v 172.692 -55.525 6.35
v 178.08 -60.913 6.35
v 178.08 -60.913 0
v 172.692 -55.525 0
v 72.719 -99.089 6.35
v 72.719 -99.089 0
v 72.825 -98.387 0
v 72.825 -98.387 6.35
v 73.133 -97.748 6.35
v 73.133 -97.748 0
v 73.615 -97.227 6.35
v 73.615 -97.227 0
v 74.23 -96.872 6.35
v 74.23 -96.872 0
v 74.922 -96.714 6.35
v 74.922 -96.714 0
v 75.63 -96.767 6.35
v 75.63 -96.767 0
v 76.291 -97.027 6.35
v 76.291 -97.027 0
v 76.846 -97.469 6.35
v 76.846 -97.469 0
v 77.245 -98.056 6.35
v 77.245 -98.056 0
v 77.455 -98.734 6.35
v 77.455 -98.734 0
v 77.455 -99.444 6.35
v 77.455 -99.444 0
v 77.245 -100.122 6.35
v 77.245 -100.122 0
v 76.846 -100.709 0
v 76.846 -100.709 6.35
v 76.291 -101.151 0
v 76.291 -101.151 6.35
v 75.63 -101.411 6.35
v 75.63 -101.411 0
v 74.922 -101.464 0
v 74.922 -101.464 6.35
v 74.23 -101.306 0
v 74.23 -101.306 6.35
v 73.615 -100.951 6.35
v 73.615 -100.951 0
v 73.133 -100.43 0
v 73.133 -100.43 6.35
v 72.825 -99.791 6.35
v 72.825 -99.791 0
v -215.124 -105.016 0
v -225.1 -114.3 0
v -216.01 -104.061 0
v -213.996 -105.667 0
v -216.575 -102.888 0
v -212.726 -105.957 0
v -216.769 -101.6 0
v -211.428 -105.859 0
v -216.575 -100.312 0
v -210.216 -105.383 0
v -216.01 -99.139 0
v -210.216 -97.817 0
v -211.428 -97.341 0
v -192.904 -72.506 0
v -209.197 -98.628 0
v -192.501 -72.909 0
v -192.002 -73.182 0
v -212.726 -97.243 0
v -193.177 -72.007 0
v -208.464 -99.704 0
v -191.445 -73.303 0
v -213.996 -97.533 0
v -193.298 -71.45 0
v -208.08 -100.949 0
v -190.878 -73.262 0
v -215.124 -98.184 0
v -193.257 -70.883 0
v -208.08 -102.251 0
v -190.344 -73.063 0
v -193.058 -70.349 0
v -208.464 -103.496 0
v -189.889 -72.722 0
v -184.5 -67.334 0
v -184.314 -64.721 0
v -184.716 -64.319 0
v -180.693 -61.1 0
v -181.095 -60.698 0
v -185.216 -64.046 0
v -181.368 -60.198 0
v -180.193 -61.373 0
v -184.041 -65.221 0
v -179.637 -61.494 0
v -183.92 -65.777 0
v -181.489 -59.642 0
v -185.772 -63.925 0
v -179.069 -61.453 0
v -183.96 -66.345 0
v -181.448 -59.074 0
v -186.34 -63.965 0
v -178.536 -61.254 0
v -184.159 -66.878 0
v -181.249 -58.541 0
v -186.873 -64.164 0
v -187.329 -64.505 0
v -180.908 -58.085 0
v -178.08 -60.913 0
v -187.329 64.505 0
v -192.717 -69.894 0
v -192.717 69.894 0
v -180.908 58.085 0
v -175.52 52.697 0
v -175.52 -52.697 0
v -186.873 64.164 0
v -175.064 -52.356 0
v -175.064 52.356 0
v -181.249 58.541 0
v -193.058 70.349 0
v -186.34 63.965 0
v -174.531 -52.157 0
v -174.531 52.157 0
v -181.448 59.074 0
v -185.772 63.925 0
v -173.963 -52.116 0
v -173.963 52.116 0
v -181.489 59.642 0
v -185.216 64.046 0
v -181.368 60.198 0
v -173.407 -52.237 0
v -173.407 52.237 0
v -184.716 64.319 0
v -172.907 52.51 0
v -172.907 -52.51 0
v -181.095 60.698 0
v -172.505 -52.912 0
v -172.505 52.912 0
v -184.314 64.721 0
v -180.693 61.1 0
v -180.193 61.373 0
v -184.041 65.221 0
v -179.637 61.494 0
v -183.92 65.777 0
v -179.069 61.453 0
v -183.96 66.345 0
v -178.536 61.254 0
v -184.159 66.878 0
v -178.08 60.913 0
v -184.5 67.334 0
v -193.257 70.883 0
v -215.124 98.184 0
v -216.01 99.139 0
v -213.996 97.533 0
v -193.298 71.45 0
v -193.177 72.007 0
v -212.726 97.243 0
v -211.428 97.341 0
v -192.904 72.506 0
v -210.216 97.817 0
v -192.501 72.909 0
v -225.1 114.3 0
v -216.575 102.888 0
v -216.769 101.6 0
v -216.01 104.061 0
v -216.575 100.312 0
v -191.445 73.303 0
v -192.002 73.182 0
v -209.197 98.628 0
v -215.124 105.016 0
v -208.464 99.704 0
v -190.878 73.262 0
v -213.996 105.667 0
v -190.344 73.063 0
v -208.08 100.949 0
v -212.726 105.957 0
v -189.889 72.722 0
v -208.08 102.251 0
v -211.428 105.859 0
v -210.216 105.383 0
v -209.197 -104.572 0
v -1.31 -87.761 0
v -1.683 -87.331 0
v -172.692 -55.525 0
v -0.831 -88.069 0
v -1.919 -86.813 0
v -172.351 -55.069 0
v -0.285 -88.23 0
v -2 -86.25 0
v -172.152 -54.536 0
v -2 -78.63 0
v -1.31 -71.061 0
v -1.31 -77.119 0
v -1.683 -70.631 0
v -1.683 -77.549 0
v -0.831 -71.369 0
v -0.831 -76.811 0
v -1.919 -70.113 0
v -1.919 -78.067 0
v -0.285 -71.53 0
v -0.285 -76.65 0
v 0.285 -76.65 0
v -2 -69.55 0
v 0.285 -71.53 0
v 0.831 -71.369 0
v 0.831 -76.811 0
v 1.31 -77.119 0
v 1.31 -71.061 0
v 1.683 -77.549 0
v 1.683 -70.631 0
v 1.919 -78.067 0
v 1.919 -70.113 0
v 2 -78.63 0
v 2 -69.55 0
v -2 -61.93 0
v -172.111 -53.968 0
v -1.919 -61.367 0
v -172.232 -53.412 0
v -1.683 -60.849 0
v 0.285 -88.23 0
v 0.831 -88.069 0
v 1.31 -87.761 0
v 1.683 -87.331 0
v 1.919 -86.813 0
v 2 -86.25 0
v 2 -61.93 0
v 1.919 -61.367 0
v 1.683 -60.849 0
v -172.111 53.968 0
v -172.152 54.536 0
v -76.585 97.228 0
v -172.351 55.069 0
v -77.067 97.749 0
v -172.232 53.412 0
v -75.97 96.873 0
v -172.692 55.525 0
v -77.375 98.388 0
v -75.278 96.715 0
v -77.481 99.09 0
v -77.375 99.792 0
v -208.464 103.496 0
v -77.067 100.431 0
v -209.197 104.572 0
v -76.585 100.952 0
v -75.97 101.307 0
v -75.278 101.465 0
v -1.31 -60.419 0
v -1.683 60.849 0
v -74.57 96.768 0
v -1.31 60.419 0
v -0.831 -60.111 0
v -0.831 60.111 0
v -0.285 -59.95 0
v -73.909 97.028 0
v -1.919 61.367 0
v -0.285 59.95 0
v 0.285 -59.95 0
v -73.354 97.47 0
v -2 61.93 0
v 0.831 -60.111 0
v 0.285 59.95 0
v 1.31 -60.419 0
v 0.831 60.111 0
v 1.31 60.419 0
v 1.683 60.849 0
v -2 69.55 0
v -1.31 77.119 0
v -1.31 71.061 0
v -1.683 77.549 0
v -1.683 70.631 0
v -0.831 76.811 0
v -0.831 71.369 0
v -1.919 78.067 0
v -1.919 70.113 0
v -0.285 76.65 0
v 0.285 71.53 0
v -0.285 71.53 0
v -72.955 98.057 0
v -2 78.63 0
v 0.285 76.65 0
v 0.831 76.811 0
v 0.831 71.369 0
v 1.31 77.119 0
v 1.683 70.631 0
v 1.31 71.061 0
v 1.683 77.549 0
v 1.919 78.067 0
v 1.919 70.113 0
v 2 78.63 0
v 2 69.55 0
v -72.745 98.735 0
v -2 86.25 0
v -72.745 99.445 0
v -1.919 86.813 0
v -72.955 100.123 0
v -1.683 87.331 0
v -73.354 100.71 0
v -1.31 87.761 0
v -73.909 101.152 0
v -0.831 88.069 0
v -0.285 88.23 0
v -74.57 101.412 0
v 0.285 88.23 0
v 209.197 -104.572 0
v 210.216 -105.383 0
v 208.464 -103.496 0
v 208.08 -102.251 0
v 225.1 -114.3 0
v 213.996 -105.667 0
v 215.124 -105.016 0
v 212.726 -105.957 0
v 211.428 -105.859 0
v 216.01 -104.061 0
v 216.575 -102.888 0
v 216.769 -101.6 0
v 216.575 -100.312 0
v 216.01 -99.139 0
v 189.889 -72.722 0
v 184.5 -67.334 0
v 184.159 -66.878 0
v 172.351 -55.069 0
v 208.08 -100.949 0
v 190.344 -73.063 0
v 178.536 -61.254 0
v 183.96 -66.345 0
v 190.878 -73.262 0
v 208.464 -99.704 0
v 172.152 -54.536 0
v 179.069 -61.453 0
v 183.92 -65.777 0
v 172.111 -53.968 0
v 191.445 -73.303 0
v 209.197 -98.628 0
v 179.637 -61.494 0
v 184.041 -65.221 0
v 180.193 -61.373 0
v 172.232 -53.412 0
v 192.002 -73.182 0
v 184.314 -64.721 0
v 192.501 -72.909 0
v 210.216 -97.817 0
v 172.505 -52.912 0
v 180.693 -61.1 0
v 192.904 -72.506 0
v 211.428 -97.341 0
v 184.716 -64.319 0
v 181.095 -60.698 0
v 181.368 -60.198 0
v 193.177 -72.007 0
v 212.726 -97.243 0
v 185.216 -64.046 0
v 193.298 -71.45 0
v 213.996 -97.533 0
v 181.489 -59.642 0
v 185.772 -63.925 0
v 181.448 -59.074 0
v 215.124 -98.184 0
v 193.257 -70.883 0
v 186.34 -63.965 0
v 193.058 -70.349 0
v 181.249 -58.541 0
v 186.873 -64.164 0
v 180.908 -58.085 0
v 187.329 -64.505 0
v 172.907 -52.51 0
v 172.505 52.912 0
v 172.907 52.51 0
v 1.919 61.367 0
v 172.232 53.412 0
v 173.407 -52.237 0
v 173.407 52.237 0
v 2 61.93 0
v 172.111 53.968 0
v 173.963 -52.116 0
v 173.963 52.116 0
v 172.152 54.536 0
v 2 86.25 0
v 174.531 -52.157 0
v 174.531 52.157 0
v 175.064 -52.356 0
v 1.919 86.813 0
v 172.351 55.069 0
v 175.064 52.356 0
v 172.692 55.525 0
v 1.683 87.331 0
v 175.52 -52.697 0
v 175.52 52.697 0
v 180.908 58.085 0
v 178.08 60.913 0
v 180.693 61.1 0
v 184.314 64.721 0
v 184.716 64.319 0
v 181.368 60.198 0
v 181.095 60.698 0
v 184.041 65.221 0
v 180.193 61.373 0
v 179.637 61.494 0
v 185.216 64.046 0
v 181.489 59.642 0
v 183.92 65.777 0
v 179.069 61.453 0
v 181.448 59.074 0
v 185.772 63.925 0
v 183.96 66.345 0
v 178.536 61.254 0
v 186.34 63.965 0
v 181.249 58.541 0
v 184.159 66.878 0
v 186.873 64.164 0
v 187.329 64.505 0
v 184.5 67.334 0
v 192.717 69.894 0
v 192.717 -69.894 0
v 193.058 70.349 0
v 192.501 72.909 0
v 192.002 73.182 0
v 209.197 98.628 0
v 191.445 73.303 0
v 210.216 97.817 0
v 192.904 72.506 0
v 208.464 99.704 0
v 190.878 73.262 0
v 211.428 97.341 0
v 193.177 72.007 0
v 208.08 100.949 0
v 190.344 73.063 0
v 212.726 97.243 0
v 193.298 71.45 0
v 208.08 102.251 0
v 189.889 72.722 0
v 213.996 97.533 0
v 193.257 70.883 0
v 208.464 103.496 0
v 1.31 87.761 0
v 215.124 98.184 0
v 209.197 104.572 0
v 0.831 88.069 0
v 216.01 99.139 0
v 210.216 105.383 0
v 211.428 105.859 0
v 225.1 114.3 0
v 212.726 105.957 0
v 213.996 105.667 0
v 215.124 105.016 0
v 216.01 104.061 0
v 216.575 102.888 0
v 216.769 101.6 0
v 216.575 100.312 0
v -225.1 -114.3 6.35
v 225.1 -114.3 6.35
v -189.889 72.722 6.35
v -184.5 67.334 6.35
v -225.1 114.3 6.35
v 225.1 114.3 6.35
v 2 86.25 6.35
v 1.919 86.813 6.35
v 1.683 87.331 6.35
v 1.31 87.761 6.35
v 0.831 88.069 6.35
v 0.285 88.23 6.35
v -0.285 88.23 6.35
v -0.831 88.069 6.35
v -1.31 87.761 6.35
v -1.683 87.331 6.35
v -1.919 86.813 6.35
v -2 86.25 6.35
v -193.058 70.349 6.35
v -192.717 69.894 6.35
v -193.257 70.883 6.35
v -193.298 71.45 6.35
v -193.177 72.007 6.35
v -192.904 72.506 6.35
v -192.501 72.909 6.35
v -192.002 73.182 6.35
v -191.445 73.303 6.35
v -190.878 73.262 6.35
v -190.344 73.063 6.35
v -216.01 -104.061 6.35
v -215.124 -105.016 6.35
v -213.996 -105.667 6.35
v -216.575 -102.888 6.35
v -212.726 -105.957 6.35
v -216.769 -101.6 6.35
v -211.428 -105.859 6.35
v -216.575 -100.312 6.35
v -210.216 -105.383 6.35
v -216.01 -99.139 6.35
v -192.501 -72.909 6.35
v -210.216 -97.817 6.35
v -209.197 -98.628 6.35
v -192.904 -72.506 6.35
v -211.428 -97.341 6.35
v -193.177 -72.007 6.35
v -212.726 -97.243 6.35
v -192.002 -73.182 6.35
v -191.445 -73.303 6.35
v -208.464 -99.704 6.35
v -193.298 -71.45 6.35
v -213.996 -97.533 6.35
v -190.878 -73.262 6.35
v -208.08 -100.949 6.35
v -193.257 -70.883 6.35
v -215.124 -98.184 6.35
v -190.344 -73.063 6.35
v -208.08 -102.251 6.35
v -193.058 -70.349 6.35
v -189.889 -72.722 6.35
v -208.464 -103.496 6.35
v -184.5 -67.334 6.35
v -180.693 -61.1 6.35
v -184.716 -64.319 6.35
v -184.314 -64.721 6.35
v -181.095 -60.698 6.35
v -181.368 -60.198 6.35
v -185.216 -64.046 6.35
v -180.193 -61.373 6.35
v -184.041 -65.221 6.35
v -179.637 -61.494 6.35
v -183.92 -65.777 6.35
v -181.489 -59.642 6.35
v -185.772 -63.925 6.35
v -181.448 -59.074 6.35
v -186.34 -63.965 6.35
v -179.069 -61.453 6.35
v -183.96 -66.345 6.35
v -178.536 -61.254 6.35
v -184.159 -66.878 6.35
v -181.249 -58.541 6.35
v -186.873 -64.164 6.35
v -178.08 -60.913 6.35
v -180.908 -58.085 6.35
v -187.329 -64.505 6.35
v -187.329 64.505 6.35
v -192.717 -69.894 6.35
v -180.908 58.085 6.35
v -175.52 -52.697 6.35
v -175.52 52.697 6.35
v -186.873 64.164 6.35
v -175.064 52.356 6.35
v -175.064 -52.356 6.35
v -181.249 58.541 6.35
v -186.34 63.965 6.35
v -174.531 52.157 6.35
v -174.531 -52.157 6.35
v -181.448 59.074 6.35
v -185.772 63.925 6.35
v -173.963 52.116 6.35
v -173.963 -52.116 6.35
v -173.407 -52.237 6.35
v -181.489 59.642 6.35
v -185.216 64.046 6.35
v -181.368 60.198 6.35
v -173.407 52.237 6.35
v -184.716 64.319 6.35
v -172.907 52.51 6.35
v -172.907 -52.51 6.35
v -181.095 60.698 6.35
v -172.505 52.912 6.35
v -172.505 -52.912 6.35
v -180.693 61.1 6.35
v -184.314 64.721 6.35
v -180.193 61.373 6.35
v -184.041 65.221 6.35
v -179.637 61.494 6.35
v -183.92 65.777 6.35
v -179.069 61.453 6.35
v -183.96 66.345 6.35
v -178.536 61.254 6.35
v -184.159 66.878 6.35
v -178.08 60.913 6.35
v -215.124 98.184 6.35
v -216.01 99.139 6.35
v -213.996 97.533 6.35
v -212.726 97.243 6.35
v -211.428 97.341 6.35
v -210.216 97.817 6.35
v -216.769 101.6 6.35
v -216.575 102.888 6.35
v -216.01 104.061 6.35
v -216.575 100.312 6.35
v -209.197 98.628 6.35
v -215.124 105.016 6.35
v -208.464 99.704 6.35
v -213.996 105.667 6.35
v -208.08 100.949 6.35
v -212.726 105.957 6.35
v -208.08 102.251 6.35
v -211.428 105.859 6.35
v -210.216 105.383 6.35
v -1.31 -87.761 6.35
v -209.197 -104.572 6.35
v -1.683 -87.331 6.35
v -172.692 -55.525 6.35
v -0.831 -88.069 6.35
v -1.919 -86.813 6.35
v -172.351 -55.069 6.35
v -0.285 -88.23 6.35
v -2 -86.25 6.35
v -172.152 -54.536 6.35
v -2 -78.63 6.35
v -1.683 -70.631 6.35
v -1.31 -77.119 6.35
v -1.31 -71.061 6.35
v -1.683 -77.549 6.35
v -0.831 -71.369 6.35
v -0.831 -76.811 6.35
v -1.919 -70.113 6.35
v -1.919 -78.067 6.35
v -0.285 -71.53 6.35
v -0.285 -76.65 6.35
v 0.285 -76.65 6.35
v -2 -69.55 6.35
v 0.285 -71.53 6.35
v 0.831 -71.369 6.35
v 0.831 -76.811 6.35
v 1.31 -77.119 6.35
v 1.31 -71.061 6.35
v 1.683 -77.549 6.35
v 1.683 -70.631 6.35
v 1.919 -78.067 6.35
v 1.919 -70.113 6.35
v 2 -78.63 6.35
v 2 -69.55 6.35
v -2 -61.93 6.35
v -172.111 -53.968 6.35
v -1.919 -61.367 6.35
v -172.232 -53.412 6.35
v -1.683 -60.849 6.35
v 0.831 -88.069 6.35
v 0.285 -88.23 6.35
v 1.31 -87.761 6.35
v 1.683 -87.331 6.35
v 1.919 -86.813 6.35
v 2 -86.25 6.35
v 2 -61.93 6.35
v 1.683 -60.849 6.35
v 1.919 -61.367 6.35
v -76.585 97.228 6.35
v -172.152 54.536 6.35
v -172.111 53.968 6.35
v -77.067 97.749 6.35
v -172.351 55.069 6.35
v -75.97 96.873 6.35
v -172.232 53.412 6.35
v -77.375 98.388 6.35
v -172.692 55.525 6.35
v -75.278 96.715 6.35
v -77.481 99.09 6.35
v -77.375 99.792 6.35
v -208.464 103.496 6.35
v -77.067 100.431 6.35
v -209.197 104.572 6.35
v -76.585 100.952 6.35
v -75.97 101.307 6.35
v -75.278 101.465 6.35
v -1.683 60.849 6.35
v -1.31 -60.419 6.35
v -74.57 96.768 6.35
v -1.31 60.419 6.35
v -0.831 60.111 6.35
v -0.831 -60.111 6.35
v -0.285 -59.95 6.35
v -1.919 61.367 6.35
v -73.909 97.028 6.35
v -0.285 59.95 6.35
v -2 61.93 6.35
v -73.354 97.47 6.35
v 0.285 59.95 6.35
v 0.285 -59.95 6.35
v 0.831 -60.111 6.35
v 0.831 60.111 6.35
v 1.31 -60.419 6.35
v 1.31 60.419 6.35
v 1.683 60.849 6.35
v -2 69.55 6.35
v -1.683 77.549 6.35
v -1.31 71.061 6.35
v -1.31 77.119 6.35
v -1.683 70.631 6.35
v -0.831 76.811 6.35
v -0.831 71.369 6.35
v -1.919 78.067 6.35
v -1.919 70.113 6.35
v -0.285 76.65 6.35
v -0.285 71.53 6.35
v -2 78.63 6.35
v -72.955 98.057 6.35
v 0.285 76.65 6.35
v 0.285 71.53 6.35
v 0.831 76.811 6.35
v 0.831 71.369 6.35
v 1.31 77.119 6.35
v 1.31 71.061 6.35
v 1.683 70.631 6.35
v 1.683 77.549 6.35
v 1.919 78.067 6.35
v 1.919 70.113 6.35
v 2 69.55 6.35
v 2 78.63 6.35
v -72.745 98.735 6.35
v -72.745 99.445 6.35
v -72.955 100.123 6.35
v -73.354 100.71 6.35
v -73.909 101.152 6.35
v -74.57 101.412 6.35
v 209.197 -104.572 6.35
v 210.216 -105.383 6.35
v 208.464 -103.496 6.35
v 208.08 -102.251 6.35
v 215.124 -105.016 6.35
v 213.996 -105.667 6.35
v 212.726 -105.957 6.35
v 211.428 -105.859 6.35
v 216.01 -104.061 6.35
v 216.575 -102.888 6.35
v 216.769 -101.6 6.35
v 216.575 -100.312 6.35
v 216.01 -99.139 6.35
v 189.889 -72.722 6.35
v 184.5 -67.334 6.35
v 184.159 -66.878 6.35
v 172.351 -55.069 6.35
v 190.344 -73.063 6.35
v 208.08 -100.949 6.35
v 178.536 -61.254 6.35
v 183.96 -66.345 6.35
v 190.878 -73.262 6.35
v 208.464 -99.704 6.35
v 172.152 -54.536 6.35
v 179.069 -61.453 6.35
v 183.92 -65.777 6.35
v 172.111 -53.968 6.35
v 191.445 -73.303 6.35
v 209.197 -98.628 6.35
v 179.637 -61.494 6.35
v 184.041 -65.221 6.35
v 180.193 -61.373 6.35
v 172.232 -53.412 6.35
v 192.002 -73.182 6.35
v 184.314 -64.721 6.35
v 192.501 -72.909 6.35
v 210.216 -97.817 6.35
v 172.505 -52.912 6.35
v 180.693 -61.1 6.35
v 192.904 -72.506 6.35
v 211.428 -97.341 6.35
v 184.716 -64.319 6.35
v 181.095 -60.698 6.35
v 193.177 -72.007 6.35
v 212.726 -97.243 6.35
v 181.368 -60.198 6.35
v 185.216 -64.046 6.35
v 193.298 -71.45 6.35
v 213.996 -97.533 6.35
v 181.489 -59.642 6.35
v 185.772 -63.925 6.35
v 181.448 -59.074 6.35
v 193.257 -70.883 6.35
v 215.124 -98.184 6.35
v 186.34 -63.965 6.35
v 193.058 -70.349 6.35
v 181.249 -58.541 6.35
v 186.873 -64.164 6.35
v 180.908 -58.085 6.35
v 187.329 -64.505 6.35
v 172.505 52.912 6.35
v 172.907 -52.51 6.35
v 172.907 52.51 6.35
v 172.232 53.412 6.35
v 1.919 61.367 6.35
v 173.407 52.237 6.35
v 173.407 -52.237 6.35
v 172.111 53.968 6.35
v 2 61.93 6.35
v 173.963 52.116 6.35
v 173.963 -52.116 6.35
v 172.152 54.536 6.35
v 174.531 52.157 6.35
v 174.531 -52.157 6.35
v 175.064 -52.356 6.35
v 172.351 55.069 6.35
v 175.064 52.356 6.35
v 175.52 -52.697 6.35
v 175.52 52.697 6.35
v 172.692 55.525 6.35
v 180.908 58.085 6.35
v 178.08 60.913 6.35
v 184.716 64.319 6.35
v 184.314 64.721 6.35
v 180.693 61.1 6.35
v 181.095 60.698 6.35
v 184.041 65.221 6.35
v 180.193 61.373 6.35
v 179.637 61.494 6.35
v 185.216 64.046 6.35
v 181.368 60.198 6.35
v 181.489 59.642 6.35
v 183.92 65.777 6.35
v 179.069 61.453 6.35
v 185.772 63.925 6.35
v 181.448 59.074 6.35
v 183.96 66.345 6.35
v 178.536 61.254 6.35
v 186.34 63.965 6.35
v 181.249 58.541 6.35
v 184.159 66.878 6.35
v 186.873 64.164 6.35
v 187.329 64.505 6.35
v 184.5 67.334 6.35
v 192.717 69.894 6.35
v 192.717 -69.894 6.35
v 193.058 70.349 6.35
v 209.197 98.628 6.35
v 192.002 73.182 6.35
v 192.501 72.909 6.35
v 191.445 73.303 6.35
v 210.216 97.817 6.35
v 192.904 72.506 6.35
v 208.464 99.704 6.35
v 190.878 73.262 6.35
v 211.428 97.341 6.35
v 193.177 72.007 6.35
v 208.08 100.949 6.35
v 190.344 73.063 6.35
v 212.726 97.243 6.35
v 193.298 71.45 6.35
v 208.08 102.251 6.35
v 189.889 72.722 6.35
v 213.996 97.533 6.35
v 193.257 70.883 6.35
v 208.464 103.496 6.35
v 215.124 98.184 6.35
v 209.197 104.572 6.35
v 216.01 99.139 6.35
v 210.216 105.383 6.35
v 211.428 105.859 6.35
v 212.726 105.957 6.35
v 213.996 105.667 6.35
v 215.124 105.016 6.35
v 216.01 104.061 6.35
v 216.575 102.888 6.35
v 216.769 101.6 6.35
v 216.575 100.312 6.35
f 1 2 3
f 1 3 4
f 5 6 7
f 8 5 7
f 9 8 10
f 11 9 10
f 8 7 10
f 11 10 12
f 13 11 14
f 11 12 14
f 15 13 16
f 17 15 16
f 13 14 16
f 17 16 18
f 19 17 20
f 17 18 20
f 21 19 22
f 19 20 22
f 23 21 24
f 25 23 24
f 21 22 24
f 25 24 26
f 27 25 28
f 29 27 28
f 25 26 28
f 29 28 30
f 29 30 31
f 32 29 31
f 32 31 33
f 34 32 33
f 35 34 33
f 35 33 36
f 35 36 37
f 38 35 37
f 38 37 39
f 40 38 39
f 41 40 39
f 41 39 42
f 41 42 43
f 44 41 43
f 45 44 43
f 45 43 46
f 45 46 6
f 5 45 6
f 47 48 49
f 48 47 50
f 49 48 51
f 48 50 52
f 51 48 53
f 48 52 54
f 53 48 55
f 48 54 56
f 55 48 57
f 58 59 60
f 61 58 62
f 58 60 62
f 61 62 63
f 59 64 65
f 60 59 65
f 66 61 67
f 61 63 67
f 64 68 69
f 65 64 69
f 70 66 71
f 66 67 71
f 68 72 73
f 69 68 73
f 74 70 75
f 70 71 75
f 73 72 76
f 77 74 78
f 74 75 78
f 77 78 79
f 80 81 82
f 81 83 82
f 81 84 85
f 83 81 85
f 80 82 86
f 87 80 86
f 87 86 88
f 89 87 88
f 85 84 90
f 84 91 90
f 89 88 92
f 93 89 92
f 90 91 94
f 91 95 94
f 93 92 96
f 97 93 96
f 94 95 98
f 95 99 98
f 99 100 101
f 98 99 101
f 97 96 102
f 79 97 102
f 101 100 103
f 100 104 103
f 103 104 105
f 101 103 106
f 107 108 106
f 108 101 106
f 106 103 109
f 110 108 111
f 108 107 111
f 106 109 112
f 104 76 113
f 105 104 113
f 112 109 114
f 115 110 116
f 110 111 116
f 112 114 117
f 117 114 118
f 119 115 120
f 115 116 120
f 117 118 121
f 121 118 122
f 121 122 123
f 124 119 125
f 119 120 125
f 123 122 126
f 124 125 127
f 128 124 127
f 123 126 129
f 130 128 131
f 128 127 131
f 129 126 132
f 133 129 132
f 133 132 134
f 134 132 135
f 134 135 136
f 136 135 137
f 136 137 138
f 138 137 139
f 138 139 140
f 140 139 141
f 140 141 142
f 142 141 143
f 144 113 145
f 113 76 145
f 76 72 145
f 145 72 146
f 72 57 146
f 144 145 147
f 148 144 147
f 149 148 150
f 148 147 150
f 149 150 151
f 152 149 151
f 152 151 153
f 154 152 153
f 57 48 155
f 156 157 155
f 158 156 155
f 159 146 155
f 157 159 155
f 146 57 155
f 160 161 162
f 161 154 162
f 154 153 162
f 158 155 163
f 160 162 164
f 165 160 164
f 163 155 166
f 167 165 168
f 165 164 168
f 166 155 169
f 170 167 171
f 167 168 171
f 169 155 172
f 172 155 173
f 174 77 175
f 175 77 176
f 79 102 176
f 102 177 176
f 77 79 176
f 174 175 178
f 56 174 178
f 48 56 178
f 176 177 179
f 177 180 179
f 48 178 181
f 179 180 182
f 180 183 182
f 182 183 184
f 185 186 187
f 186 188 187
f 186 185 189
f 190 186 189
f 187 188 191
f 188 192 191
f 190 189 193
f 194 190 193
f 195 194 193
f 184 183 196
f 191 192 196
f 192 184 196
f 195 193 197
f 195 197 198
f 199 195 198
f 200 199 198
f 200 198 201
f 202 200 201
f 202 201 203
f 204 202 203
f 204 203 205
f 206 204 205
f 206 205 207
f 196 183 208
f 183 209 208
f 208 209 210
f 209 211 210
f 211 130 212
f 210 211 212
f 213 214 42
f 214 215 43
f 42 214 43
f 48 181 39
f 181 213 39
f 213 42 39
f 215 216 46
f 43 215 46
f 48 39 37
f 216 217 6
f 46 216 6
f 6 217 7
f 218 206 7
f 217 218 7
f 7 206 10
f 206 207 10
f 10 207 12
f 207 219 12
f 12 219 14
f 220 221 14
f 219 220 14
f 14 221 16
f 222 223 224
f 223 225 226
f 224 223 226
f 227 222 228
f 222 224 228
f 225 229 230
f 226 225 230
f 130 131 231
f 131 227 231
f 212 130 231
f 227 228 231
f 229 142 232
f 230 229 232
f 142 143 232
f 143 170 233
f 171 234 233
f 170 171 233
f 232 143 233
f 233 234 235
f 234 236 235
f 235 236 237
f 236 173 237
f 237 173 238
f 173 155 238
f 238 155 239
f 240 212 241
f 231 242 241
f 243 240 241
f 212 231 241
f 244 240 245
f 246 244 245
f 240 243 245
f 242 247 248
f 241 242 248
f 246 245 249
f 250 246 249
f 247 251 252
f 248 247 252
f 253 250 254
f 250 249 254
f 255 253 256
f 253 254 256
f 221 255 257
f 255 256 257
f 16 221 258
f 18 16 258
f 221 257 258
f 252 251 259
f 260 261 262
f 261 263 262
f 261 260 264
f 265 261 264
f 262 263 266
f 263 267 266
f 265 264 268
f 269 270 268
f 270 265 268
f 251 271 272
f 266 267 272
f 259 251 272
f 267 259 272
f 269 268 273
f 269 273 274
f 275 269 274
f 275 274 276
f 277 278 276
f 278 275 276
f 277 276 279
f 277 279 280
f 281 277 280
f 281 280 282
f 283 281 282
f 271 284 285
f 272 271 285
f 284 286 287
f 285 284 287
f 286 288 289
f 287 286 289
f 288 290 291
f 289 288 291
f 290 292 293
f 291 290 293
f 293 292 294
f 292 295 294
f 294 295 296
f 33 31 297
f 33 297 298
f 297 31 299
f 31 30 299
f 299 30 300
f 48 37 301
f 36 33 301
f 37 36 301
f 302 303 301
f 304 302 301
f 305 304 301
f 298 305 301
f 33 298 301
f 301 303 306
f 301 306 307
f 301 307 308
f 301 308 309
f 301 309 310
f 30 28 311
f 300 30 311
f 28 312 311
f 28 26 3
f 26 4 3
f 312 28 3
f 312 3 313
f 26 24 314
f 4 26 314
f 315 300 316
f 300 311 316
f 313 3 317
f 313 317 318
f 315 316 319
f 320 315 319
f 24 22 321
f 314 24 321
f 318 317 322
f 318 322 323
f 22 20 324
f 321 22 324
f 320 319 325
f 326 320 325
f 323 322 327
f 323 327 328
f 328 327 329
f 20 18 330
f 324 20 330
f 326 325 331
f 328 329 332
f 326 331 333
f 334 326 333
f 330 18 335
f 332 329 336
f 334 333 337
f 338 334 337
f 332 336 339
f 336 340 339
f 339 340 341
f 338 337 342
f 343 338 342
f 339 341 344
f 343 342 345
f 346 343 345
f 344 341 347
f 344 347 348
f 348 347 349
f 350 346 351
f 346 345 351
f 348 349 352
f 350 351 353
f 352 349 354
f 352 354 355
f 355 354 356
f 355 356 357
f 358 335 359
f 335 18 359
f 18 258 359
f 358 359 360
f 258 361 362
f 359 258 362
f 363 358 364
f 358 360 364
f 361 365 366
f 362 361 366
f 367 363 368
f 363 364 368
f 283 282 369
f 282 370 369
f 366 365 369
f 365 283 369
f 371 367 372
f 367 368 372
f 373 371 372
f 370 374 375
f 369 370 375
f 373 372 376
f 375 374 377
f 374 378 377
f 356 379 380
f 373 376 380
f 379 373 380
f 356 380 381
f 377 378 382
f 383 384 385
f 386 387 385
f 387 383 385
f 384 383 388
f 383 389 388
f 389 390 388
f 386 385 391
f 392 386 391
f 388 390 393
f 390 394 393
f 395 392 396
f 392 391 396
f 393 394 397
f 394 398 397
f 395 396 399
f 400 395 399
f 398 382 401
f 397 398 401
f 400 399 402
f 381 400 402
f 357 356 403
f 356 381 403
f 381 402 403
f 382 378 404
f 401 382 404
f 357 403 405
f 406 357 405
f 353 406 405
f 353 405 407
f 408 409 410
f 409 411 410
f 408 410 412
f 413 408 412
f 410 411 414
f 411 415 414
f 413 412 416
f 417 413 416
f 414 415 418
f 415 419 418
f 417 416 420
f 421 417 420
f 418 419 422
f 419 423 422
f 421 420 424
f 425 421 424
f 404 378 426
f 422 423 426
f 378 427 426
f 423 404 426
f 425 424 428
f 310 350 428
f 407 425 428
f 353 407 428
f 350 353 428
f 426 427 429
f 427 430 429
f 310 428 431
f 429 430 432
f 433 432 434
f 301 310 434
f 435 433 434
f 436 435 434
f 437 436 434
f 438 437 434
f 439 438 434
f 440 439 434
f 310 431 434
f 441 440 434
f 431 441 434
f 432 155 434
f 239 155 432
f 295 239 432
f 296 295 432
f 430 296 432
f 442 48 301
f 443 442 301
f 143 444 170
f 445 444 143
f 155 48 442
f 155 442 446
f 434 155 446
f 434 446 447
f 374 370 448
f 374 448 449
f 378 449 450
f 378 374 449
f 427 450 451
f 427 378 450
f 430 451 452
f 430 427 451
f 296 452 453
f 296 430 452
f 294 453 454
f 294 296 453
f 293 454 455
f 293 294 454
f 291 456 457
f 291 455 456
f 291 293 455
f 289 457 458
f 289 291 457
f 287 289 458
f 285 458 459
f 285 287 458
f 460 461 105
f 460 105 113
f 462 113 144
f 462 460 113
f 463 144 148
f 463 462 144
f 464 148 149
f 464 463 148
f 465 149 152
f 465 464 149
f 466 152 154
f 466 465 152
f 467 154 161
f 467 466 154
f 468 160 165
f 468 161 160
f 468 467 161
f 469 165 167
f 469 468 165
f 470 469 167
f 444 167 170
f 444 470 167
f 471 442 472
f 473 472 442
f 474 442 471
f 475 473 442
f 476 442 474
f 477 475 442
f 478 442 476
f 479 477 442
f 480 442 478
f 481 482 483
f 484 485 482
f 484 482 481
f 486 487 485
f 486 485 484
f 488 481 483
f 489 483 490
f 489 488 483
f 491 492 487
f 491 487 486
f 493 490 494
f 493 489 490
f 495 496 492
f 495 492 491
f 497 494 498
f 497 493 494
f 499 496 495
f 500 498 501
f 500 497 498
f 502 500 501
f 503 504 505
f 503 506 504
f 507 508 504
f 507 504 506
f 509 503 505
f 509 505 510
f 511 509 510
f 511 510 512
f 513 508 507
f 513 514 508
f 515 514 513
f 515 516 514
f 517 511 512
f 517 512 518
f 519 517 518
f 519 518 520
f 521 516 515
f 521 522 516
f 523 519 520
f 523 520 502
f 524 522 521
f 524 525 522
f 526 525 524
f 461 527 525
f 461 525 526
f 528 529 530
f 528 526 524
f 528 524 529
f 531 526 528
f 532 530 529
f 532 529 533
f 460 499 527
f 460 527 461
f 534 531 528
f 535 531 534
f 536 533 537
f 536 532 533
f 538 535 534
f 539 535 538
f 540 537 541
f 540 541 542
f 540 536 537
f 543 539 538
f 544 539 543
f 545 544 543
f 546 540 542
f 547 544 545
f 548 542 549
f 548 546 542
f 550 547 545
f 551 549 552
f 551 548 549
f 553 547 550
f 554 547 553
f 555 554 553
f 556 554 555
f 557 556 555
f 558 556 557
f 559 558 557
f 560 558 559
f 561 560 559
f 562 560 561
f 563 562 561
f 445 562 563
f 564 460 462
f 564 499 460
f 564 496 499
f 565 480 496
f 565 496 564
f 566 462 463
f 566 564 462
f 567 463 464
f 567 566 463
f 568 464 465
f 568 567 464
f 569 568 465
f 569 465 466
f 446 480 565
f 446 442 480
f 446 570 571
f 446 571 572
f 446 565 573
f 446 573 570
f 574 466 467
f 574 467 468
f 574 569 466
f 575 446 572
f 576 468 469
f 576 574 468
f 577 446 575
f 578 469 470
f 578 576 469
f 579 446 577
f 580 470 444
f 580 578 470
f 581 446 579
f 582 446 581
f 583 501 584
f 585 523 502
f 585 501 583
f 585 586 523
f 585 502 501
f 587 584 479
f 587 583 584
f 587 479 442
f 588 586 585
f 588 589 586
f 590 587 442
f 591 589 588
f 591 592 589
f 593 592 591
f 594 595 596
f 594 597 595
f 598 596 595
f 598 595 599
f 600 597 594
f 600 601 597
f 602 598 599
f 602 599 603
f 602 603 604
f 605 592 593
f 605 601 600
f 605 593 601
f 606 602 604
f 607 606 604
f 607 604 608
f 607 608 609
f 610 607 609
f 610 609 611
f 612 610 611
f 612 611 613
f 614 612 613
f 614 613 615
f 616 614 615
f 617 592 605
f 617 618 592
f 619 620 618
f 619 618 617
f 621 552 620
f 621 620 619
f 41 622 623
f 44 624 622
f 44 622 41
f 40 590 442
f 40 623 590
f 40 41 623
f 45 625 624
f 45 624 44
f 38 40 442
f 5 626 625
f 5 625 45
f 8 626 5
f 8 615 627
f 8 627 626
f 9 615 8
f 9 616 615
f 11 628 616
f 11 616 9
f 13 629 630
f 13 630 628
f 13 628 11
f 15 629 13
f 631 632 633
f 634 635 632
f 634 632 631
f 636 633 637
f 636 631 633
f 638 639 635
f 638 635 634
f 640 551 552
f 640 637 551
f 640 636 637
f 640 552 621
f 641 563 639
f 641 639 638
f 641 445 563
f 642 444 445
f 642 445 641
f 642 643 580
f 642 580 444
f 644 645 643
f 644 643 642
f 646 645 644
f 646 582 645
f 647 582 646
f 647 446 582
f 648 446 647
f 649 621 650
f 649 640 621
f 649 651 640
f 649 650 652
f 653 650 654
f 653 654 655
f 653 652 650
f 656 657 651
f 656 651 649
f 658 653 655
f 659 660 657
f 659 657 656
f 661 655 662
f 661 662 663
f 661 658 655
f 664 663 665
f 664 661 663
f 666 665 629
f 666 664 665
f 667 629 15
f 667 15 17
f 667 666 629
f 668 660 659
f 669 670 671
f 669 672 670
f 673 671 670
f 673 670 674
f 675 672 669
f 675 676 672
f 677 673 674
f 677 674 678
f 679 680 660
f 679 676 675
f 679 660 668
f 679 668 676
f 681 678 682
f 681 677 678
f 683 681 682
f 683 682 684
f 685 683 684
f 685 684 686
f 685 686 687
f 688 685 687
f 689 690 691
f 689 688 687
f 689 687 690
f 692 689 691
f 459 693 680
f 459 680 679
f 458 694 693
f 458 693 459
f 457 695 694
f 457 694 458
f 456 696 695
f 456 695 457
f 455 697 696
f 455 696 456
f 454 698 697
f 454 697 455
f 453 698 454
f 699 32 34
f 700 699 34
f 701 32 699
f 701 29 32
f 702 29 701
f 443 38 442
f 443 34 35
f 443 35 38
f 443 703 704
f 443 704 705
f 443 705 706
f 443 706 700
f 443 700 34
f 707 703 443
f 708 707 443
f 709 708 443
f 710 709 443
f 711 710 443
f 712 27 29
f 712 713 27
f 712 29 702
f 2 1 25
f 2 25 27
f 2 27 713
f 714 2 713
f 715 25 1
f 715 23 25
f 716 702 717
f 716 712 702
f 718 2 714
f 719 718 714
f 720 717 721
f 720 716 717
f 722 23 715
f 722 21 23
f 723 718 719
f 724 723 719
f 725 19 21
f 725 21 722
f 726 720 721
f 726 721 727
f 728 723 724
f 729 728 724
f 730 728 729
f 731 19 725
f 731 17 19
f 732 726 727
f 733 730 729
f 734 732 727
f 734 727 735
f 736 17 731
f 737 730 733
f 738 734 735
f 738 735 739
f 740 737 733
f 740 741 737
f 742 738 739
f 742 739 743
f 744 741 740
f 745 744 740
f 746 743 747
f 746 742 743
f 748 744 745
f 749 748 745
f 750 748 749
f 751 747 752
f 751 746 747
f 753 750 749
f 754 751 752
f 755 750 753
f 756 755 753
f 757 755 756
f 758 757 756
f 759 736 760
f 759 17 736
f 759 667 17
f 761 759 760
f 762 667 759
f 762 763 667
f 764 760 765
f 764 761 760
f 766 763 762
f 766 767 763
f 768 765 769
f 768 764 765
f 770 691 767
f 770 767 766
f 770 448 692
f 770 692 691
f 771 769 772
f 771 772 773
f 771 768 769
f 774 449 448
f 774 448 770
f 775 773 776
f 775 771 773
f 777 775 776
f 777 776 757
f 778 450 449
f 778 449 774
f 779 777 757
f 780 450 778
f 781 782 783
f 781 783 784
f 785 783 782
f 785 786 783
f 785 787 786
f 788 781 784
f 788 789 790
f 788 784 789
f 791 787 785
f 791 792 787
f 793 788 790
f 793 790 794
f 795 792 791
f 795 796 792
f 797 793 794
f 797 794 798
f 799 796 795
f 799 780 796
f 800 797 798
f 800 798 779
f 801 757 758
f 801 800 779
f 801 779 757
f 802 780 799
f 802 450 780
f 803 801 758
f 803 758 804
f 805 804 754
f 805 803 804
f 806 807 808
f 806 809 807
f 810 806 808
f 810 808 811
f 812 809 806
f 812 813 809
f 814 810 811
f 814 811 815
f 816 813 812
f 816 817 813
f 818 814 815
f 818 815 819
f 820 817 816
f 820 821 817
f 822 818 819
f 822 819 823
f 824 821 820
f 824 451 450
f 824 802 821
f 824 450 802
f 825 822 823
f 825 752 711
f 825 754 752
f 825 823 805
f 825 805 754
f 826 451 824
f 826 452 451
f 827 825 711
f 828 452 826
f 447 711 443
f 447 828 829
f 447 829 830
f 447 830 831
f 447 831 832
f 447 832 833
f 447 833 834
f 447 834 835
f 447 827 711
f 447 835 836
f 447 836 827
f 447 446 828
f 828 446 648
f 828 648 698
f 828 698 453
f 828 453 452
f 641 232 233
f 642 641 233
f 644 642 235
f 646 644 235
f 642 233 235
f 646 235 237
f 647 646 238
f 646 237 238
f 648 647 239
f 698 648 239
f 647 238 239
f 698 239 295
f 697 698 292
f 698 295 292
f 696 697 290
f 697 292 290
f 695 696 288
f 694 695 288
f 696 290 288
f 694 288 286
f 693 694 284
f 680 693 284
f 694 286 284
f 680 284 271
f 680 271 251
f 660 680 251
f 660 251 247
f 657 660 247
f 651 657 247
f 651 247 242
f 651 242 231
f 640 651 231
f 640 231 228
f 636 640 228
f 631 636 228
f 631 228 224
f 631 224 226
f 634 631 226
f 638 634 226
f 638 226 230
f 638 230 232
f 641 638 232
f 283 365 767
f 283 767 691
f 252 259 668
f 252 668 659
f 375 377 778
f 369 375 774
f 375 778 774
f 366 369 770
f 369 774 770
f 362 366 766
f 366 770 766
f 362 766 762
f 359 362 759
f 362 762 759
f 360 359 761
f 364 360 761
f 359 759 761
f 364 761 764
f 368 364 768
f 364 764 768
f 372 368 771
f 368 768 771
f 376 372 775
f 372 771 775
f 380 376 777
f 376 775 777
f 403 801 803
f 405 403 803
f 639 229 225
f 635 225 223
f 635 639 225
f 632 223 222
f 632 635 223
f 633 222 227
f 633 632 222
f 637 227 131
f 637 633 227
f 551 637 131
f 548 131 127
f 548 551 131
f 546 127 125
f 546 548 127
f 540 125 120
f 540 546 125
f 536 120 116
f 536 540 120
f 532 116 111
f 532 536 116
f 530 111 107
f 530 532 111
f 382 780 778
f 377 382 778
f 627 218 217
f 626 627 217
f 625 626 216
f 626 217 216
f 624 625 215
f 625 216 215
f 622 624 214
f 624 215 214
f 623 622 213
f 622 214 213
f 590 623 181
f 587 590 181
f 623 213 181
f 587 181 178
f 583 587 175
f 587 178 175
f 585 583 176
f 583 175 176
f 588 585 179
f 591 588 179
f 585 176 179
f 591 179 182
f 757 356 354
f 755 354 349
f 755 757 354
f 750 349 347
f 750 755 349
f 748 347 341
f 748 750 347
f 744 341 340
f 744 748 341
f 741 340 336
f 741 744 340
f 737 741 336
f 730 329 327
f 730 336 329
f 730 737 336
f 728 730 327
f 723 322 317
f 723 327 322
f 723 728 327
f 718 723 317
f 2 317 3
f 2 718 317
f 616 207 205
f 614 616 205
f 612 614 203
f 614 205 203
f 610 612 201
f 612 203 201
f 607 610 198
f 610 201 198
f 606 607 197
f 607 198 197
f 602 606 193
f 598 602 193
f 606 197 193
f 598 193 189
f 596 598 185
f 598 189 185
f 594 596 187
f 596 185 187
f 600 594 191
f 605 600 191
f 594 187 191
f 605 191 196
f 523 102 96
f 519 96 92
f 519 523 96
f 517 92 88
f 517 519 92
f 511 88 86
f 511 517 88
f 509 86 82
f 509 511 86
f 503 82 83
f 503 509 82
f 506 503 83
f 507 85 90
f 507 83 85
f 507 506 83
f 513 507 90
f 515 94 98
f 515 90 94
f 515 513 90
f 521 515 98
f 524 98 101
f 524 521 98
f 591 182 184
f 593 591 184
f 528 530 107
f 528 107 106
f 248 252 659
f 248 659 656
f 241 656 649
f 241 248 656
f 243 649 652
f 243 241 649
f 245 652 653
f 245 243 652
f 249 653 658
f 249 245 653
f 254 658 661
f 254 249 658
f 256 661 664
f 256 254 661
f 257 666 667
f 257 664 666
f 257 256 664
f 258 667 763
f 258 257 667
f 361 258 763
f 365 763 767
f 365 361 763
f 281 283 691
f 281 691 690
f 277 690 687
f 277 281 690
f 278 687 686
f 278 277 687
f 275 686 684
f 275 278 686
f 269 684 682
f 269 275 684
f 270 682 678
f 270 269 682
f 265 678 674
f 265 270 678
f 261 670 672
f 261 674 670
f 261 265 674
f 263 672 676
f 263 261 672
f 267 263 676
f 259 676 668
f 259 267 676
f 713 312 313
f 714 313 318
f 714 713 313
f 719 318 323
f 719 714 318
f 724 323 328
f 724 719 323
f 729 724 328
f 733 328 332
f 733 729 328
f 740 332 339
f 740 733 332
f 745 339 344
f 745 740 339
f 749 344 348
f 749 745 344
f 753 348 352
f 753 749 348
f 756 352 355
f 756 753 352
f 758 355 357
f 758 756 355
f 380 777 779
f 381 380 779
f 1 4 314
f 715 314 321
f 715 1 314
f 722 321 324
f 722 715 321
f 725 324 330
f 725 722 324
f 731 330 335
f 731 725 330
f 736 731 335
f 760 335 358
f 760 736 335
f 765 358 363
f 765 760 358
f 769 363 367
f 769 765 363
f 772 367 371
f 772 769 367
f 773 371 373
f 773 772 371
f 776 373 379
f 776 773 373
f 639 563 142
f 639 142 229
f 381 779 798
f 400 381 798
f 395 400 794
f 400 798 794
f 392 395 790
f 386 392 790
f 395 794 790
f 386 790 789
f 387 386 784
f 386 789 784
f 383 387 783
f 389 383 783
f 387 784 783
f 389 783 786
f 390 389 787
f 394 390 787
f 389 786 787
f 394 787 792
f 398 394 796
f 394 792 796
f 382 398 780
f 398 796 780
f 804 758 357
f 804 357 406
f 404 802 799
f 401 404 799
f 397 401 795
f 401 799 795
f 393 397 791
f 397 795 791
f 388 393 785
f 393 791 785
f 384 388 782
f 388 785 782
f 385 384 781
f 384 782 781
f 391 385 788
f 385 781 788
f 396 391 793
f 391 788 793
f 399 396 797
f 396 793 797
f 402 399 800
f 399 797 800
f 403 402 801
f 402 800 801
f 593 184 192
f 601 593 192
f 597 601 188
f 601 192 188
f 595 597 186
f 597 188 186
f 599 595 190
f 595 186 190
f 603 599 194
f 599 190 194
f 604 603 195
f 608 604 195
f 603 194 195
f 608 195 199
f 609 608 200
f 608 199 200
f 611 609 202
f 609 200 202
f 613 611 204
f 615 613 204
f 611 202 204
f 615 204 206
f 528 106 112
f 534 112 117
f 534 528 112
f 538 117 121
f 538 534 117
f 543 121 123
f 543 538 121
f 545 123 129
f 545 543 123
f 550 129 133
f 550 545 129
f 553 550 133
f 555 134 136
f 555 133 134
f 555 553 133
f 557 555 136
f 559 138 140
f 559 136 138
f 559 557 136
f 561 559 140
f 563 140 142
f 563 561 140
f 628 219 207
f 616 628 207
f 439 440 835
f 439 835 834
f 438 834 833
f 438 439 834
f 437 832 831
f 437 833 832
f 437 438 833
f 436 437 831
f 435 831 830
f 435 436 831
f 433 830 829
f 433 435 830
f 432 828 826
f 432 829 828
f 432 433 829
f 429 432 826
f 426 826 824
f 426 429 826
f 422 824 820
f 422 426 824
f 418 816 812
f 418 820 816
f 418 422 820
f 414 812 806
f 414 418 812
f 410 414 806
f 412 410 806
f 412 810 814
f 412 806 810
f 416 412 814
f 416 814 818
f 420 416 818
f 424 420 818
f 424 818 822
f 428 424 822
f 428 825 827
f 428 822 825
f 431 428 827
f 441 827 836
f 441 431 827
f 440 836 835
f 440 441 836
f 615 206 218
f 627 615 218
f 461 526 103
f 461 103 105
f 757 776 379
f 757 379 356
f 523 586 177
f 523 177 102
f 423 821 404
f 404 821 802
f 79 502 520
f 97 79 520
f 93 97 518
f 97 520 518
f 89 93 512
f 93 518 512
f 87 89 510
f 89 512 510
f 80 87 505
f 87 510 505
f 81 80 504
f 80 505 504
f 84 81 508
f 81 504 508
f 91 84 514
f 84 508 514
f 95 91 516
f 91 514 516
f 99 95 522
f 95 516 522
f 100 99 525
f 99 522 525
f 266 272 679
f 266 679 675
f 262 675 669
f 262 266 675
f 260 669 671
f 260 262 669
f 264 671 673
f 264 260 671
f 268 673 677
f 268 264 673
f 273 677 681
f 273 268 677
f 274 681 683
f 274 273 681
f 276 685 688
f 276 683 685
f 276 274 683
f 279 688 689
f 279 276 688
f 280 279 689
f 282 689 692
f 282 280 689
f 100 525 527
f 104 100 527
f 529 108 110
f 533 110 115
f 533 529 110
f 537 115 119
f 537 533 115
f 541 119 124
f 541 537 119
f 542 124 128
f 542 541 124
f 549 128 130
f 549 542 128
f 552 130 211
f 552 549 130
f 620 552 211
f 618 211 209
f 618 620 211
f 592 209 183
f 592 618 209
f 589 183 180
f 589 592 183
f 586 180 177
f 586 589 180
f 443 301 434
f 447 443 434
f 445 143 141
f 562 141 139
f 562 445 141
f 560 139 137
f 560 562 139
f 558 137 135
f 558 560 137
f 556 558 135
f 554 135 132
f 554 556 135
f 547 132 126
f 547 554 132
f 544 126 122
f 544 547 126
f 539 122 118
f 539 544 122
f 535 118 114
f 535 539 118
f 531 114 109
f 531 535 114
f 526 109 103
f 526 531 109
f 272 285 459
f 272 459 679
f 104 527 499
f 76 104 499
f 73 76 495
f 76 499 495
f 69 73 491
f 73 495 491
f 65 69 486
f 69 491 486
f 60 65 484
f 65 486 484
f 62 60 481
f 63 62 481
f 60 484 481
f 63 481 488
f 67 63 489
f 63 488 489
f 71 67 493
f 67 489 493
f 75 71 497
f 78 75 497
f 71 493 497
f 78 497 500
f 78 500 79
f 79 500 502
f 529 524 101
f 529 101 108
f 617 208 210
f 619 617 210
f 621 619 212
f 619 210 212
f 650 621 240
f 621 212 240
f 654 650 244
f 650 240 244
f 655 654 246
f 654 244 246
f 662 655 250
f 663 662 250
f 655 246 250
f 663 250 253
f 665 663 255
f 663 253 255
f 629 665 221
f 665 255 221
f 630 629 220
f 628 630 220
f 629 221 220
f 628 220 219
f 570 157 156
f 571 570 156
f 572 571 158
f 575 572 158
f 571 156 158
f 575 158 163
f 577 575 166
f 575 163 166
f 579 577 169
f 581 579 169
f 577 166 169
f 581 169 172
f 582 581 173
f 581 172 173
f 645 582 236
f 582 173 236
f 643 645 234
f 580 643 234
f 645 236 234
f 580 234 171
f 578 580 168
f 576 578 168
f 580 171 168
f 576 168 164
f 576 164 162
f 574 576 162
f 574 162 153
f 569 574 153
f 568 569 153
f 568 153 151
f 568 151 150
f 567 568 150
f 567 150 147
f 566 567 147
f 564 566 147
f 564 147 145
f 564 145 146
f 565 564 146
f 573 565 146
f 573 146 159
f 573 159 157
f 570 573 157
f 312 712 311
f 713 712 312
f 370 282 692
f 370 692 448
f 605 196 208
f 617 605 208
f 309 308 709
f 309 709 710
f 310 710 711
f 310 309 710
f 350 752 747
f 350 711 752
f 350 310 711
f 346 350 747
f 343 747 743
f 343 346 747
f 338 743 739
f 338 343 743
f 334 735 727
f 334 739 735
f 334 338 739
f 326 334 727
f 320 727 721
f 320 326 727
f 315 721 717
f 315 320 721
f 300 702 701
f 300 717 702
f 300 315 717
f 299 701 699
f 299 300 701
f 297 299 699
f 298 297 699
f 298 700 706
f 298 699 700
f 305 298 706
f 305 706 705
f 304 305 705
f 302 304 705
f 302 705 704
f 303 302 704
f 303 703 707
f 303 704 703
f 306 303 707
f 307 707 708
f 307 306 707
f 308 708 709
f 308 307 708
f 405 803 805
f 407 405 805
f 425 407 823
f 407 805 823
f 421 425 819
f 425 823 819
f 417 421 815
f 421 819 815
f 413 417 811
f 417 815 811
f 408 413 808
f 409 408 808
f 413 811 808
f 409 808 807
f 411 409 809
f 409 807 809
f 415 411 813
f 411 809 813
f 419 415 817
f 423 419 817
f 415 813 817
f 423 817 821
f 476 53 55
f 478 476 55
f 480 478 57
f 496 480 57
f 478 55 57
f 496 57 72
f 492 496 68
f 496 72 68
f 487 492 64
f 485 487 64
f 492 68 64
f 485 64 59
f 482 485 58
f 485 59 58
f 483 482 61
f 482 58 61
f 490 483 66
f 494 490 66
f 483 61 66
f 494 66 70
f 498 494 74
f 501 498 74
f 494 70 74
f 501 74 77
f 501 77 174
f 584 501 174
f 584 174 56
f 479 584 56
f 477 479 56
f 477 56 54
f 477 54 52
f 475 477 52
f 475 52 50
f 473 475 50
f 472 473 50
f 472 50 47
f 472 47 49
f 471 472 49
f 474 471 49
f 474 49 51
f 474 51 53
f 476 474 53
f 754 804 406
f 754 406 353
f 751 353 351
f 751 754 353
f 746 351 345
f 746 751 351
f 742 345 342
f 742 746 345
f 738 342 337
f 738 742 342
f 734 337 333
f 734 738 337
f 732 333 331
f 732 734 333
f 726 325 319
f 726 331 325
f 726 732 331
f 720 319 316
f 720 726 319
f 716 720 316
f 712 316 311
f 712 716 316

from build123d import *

# Parameters (mm, degrees)
SKETCH1_W           = 450.2
SKETCH1_H           = 228.6
BOSS_EXTRUDE1_DEPTH = 6.35
CORNER_SLOTS_DEPTH  = 10
FOOT_HOLES_1_4_20_D = 8.7376
ESD_FASTERNERS_D    = 4.7625
MIDDLE_SLOTS_DEPTH  = 10


with BuildPart() as part:
    # Sketch1 → Boss-Extrude1 (new body)
    with BuildSketch(Plane.XY):
        Rectangle(SKETCH1_W, SKETCH1_H)
    extrude(amount=BOSS_EXTRUDE1_DEPTH)

    # Sketch3 → Corner Slots (cut)
    with BuildSketch(Plane.XY.offset(6.35)):
        with BuildLine():
            ThreePointArc((-180.908290444, 58.084863229), (-180.908290444, 60.913290444), (-178.079863229, 60.913290444))
            Line((-178.079863229, 60.913290444), (-172.691709556, 55.525136771))
            ThreePointArc((-172.691709556, 55.525136771), (-172.691709556, 52.696709556), (-175.520136771, 52.696709556))
            Line((-175.520136771, 52.696709556), (-180.908290444, 58.084863229))
        make_face()
        with BuildLine():
            ThreePointArc((-184.500392892, 67.333820108), (-184.500392892, 64.505392892), (-187.328820108, 64.505392892))
            Line((-187.328820108, 64.505392892), (-192.71697378, 69.893546565))
            ThreePointArc((-192.71697378, 69.893546565), (-192.71697378, 72.72197378), (-189.888546565, 72.72197378))
            Line((-189.888546565, 72.72197378), (-184.500392892, 67.333820108))
        make_face()
        with BuildLine():
            Line((189.888546565, 72.72197378), (184.500392892, 67.333820108))
            ThreePointArc((184.500392892, 67.333820108), (184.500392892, 64.505392892), (187.328820108, 64.505392892))
            Line((187.328820108, 64.505392892), (192.71697378, 69.893546565))
            ThreePointArc((192.71697378, 69.893546565), (192.71697378, 72.72197378), (189.888546565, 72.72197378))
        make_face()
        with BuildLine():
            Line((175.520136771, 52.696709556), (180.908290444, 58.084863229))
            ThreePointArc((180.908290444, 58.084863229), (180.908290444, 60.913290444), (178.079863229, 60.913290444))
            Line((178.079863229, 60.913290444), (172.691709556, 55.525136771))
            ThreePointArc((172.691709556, 55.525136771), (172.691709556, 52.696709556), (175.520136771, 52.696709556))
        make_face()
        with BuildLine():
            ThreePointArc((184.500392892, -67.333820108), (184.500392892, -64.505392892), (187.328820108, -64.505392892))
            Line((187.328820108, -64.505392892), (192.71697378, -69.893546565))
            ThreePointArc((192.71697378, -69.893546565), (192.71697378, -72.72197378), (189.888546565, -72.72197378))
            Line((189.888546565, -72.72197378), (184.500392892, -67.333820108))
        make_face()
        with BuildLine():
            ThreePointArc((180.908290444, -58.084863229), (180.908290444, -60.913290444), (178.079863229, -60.913290444))
            Line((178.079863229, -60.913290444), (172.691709556, -55.525136771))
            ThreePointArc((172.691709556, -55.525136771), (172.691709556, -52.696709556), (175.520136771, -52.696709556))
            Line((175.520136771, -52.696709556), (180.908290444, -58.084863229))
        make_face()
        with BuildLine():
            Line((-172.691709556, -55.525136771), (-178.079863229, -60.913290444))
            ThreePointArc((-178.079863229, -60.913290444), (-180.908290444, -60.913290444), (-180.908290444, -58.084863229))
            Line((-180.908290444, -58.084863229), (-175.520136771, -52.696709556))
            ThreePointArc((-175.520136771, -52.696709556), (-172.691709556, -52.696709556), (-172.691709556, -55.525136771))
        make_face()
        with BuildLine():
            Line((-189.888546565, -72.72197378), (-184.500392892, -67.333820108))
            ThreePointArc((-184.500392892, -67.333820108), (-184.500392892, -64.505392892), (-187.328820108, -64.505392892))
            Line((-187.328820108, -64.505392892), (-192.71697378, -69.893546565))
            ThreePointArc((-192.71697378, -69.893546565), (-192.71697378, -72.72197378), (-189.888546565, -72.72197378))
        make_face()
    extrude(amount=-CORNER_SLOTS_DEPTH, mode=Mode.SUBTRACT)

    # Foot Holes 1/4-20 (through all)
    with Locations(Plane.XY.offset(6.35)):
        with Locations((-212.4, 101.6), (-212.4, -101.6)):
            foot_holes_1_4_20 = Hole(FOOT_HOLES_1_4_20_D / 2)

    # Mirror2: Foot Holes 1/4-20 across plane
    add(foot_holes_1_4_20.mirror(Plane(origin=(0, 0, 0), x_dir=(0, 0, 1), z_dir=(1, 0, 0))), mode=Mode.SUBTRACT)

    # ESD Fasterners (through all)
    with Locations(Plane.XY.offset(6.35)):
        with Locations((-75.1, 99.09), (75.1, -99.089)):
            Hole(ESD_FASTERNERS_D / 2)

    # Sketch16 → Middle Slots (cut)
    with BuildSketch(Plane.XY):
        with BuildLine():
            Line((2, -78.63), (2, -86.25))
            ThreePointArc((2, -86.25), (0, -88.25), (-2, -86.25))
            Line((-2, -86.25), (-2, -78.63))
            ThreePointArc((-2, -78.63), (0, -76.63), (2, -78.63))
        make_face()
        with BuildLine():
            Line((-2, -69.55), (-2, -61.93))
            ThreePointArc((-2, -61.93), (0, -59.93), (2, -61.93))
            Line((2, -61.93), (2, -69.55))
            ThreePointArc((2, -69.55), (0, -71.55), (-2, -69.55))
        make_face()
        with BuildLine():
            Line((2, 78.63), (2, 86.25))
            ThreePointArc((2, 86.25), (0, 88.25), (-2, 86.25))
            Line((-2, 86.25), (-2, 78.63))
            ThreePointArc((-2, 78.63), (0, 76.63), (2, 78.63))
        make_face()
        with BuildLine():
            Line((-2, 69.55), (-2, 61.93))
            ThreePointArc((-2, 61.93), (0, 59.93), (2, 61.93))
            Line((2, 61.93), (2, 69.55))
            ThreePointArc((2, 69.55), (0, 71.55), (-2, 69.55))
        make_face()
    extrude(amount=MIDDLE_SLOTS_DEPTH, mode=Mode.SUBTRACT)


solid = part.part
